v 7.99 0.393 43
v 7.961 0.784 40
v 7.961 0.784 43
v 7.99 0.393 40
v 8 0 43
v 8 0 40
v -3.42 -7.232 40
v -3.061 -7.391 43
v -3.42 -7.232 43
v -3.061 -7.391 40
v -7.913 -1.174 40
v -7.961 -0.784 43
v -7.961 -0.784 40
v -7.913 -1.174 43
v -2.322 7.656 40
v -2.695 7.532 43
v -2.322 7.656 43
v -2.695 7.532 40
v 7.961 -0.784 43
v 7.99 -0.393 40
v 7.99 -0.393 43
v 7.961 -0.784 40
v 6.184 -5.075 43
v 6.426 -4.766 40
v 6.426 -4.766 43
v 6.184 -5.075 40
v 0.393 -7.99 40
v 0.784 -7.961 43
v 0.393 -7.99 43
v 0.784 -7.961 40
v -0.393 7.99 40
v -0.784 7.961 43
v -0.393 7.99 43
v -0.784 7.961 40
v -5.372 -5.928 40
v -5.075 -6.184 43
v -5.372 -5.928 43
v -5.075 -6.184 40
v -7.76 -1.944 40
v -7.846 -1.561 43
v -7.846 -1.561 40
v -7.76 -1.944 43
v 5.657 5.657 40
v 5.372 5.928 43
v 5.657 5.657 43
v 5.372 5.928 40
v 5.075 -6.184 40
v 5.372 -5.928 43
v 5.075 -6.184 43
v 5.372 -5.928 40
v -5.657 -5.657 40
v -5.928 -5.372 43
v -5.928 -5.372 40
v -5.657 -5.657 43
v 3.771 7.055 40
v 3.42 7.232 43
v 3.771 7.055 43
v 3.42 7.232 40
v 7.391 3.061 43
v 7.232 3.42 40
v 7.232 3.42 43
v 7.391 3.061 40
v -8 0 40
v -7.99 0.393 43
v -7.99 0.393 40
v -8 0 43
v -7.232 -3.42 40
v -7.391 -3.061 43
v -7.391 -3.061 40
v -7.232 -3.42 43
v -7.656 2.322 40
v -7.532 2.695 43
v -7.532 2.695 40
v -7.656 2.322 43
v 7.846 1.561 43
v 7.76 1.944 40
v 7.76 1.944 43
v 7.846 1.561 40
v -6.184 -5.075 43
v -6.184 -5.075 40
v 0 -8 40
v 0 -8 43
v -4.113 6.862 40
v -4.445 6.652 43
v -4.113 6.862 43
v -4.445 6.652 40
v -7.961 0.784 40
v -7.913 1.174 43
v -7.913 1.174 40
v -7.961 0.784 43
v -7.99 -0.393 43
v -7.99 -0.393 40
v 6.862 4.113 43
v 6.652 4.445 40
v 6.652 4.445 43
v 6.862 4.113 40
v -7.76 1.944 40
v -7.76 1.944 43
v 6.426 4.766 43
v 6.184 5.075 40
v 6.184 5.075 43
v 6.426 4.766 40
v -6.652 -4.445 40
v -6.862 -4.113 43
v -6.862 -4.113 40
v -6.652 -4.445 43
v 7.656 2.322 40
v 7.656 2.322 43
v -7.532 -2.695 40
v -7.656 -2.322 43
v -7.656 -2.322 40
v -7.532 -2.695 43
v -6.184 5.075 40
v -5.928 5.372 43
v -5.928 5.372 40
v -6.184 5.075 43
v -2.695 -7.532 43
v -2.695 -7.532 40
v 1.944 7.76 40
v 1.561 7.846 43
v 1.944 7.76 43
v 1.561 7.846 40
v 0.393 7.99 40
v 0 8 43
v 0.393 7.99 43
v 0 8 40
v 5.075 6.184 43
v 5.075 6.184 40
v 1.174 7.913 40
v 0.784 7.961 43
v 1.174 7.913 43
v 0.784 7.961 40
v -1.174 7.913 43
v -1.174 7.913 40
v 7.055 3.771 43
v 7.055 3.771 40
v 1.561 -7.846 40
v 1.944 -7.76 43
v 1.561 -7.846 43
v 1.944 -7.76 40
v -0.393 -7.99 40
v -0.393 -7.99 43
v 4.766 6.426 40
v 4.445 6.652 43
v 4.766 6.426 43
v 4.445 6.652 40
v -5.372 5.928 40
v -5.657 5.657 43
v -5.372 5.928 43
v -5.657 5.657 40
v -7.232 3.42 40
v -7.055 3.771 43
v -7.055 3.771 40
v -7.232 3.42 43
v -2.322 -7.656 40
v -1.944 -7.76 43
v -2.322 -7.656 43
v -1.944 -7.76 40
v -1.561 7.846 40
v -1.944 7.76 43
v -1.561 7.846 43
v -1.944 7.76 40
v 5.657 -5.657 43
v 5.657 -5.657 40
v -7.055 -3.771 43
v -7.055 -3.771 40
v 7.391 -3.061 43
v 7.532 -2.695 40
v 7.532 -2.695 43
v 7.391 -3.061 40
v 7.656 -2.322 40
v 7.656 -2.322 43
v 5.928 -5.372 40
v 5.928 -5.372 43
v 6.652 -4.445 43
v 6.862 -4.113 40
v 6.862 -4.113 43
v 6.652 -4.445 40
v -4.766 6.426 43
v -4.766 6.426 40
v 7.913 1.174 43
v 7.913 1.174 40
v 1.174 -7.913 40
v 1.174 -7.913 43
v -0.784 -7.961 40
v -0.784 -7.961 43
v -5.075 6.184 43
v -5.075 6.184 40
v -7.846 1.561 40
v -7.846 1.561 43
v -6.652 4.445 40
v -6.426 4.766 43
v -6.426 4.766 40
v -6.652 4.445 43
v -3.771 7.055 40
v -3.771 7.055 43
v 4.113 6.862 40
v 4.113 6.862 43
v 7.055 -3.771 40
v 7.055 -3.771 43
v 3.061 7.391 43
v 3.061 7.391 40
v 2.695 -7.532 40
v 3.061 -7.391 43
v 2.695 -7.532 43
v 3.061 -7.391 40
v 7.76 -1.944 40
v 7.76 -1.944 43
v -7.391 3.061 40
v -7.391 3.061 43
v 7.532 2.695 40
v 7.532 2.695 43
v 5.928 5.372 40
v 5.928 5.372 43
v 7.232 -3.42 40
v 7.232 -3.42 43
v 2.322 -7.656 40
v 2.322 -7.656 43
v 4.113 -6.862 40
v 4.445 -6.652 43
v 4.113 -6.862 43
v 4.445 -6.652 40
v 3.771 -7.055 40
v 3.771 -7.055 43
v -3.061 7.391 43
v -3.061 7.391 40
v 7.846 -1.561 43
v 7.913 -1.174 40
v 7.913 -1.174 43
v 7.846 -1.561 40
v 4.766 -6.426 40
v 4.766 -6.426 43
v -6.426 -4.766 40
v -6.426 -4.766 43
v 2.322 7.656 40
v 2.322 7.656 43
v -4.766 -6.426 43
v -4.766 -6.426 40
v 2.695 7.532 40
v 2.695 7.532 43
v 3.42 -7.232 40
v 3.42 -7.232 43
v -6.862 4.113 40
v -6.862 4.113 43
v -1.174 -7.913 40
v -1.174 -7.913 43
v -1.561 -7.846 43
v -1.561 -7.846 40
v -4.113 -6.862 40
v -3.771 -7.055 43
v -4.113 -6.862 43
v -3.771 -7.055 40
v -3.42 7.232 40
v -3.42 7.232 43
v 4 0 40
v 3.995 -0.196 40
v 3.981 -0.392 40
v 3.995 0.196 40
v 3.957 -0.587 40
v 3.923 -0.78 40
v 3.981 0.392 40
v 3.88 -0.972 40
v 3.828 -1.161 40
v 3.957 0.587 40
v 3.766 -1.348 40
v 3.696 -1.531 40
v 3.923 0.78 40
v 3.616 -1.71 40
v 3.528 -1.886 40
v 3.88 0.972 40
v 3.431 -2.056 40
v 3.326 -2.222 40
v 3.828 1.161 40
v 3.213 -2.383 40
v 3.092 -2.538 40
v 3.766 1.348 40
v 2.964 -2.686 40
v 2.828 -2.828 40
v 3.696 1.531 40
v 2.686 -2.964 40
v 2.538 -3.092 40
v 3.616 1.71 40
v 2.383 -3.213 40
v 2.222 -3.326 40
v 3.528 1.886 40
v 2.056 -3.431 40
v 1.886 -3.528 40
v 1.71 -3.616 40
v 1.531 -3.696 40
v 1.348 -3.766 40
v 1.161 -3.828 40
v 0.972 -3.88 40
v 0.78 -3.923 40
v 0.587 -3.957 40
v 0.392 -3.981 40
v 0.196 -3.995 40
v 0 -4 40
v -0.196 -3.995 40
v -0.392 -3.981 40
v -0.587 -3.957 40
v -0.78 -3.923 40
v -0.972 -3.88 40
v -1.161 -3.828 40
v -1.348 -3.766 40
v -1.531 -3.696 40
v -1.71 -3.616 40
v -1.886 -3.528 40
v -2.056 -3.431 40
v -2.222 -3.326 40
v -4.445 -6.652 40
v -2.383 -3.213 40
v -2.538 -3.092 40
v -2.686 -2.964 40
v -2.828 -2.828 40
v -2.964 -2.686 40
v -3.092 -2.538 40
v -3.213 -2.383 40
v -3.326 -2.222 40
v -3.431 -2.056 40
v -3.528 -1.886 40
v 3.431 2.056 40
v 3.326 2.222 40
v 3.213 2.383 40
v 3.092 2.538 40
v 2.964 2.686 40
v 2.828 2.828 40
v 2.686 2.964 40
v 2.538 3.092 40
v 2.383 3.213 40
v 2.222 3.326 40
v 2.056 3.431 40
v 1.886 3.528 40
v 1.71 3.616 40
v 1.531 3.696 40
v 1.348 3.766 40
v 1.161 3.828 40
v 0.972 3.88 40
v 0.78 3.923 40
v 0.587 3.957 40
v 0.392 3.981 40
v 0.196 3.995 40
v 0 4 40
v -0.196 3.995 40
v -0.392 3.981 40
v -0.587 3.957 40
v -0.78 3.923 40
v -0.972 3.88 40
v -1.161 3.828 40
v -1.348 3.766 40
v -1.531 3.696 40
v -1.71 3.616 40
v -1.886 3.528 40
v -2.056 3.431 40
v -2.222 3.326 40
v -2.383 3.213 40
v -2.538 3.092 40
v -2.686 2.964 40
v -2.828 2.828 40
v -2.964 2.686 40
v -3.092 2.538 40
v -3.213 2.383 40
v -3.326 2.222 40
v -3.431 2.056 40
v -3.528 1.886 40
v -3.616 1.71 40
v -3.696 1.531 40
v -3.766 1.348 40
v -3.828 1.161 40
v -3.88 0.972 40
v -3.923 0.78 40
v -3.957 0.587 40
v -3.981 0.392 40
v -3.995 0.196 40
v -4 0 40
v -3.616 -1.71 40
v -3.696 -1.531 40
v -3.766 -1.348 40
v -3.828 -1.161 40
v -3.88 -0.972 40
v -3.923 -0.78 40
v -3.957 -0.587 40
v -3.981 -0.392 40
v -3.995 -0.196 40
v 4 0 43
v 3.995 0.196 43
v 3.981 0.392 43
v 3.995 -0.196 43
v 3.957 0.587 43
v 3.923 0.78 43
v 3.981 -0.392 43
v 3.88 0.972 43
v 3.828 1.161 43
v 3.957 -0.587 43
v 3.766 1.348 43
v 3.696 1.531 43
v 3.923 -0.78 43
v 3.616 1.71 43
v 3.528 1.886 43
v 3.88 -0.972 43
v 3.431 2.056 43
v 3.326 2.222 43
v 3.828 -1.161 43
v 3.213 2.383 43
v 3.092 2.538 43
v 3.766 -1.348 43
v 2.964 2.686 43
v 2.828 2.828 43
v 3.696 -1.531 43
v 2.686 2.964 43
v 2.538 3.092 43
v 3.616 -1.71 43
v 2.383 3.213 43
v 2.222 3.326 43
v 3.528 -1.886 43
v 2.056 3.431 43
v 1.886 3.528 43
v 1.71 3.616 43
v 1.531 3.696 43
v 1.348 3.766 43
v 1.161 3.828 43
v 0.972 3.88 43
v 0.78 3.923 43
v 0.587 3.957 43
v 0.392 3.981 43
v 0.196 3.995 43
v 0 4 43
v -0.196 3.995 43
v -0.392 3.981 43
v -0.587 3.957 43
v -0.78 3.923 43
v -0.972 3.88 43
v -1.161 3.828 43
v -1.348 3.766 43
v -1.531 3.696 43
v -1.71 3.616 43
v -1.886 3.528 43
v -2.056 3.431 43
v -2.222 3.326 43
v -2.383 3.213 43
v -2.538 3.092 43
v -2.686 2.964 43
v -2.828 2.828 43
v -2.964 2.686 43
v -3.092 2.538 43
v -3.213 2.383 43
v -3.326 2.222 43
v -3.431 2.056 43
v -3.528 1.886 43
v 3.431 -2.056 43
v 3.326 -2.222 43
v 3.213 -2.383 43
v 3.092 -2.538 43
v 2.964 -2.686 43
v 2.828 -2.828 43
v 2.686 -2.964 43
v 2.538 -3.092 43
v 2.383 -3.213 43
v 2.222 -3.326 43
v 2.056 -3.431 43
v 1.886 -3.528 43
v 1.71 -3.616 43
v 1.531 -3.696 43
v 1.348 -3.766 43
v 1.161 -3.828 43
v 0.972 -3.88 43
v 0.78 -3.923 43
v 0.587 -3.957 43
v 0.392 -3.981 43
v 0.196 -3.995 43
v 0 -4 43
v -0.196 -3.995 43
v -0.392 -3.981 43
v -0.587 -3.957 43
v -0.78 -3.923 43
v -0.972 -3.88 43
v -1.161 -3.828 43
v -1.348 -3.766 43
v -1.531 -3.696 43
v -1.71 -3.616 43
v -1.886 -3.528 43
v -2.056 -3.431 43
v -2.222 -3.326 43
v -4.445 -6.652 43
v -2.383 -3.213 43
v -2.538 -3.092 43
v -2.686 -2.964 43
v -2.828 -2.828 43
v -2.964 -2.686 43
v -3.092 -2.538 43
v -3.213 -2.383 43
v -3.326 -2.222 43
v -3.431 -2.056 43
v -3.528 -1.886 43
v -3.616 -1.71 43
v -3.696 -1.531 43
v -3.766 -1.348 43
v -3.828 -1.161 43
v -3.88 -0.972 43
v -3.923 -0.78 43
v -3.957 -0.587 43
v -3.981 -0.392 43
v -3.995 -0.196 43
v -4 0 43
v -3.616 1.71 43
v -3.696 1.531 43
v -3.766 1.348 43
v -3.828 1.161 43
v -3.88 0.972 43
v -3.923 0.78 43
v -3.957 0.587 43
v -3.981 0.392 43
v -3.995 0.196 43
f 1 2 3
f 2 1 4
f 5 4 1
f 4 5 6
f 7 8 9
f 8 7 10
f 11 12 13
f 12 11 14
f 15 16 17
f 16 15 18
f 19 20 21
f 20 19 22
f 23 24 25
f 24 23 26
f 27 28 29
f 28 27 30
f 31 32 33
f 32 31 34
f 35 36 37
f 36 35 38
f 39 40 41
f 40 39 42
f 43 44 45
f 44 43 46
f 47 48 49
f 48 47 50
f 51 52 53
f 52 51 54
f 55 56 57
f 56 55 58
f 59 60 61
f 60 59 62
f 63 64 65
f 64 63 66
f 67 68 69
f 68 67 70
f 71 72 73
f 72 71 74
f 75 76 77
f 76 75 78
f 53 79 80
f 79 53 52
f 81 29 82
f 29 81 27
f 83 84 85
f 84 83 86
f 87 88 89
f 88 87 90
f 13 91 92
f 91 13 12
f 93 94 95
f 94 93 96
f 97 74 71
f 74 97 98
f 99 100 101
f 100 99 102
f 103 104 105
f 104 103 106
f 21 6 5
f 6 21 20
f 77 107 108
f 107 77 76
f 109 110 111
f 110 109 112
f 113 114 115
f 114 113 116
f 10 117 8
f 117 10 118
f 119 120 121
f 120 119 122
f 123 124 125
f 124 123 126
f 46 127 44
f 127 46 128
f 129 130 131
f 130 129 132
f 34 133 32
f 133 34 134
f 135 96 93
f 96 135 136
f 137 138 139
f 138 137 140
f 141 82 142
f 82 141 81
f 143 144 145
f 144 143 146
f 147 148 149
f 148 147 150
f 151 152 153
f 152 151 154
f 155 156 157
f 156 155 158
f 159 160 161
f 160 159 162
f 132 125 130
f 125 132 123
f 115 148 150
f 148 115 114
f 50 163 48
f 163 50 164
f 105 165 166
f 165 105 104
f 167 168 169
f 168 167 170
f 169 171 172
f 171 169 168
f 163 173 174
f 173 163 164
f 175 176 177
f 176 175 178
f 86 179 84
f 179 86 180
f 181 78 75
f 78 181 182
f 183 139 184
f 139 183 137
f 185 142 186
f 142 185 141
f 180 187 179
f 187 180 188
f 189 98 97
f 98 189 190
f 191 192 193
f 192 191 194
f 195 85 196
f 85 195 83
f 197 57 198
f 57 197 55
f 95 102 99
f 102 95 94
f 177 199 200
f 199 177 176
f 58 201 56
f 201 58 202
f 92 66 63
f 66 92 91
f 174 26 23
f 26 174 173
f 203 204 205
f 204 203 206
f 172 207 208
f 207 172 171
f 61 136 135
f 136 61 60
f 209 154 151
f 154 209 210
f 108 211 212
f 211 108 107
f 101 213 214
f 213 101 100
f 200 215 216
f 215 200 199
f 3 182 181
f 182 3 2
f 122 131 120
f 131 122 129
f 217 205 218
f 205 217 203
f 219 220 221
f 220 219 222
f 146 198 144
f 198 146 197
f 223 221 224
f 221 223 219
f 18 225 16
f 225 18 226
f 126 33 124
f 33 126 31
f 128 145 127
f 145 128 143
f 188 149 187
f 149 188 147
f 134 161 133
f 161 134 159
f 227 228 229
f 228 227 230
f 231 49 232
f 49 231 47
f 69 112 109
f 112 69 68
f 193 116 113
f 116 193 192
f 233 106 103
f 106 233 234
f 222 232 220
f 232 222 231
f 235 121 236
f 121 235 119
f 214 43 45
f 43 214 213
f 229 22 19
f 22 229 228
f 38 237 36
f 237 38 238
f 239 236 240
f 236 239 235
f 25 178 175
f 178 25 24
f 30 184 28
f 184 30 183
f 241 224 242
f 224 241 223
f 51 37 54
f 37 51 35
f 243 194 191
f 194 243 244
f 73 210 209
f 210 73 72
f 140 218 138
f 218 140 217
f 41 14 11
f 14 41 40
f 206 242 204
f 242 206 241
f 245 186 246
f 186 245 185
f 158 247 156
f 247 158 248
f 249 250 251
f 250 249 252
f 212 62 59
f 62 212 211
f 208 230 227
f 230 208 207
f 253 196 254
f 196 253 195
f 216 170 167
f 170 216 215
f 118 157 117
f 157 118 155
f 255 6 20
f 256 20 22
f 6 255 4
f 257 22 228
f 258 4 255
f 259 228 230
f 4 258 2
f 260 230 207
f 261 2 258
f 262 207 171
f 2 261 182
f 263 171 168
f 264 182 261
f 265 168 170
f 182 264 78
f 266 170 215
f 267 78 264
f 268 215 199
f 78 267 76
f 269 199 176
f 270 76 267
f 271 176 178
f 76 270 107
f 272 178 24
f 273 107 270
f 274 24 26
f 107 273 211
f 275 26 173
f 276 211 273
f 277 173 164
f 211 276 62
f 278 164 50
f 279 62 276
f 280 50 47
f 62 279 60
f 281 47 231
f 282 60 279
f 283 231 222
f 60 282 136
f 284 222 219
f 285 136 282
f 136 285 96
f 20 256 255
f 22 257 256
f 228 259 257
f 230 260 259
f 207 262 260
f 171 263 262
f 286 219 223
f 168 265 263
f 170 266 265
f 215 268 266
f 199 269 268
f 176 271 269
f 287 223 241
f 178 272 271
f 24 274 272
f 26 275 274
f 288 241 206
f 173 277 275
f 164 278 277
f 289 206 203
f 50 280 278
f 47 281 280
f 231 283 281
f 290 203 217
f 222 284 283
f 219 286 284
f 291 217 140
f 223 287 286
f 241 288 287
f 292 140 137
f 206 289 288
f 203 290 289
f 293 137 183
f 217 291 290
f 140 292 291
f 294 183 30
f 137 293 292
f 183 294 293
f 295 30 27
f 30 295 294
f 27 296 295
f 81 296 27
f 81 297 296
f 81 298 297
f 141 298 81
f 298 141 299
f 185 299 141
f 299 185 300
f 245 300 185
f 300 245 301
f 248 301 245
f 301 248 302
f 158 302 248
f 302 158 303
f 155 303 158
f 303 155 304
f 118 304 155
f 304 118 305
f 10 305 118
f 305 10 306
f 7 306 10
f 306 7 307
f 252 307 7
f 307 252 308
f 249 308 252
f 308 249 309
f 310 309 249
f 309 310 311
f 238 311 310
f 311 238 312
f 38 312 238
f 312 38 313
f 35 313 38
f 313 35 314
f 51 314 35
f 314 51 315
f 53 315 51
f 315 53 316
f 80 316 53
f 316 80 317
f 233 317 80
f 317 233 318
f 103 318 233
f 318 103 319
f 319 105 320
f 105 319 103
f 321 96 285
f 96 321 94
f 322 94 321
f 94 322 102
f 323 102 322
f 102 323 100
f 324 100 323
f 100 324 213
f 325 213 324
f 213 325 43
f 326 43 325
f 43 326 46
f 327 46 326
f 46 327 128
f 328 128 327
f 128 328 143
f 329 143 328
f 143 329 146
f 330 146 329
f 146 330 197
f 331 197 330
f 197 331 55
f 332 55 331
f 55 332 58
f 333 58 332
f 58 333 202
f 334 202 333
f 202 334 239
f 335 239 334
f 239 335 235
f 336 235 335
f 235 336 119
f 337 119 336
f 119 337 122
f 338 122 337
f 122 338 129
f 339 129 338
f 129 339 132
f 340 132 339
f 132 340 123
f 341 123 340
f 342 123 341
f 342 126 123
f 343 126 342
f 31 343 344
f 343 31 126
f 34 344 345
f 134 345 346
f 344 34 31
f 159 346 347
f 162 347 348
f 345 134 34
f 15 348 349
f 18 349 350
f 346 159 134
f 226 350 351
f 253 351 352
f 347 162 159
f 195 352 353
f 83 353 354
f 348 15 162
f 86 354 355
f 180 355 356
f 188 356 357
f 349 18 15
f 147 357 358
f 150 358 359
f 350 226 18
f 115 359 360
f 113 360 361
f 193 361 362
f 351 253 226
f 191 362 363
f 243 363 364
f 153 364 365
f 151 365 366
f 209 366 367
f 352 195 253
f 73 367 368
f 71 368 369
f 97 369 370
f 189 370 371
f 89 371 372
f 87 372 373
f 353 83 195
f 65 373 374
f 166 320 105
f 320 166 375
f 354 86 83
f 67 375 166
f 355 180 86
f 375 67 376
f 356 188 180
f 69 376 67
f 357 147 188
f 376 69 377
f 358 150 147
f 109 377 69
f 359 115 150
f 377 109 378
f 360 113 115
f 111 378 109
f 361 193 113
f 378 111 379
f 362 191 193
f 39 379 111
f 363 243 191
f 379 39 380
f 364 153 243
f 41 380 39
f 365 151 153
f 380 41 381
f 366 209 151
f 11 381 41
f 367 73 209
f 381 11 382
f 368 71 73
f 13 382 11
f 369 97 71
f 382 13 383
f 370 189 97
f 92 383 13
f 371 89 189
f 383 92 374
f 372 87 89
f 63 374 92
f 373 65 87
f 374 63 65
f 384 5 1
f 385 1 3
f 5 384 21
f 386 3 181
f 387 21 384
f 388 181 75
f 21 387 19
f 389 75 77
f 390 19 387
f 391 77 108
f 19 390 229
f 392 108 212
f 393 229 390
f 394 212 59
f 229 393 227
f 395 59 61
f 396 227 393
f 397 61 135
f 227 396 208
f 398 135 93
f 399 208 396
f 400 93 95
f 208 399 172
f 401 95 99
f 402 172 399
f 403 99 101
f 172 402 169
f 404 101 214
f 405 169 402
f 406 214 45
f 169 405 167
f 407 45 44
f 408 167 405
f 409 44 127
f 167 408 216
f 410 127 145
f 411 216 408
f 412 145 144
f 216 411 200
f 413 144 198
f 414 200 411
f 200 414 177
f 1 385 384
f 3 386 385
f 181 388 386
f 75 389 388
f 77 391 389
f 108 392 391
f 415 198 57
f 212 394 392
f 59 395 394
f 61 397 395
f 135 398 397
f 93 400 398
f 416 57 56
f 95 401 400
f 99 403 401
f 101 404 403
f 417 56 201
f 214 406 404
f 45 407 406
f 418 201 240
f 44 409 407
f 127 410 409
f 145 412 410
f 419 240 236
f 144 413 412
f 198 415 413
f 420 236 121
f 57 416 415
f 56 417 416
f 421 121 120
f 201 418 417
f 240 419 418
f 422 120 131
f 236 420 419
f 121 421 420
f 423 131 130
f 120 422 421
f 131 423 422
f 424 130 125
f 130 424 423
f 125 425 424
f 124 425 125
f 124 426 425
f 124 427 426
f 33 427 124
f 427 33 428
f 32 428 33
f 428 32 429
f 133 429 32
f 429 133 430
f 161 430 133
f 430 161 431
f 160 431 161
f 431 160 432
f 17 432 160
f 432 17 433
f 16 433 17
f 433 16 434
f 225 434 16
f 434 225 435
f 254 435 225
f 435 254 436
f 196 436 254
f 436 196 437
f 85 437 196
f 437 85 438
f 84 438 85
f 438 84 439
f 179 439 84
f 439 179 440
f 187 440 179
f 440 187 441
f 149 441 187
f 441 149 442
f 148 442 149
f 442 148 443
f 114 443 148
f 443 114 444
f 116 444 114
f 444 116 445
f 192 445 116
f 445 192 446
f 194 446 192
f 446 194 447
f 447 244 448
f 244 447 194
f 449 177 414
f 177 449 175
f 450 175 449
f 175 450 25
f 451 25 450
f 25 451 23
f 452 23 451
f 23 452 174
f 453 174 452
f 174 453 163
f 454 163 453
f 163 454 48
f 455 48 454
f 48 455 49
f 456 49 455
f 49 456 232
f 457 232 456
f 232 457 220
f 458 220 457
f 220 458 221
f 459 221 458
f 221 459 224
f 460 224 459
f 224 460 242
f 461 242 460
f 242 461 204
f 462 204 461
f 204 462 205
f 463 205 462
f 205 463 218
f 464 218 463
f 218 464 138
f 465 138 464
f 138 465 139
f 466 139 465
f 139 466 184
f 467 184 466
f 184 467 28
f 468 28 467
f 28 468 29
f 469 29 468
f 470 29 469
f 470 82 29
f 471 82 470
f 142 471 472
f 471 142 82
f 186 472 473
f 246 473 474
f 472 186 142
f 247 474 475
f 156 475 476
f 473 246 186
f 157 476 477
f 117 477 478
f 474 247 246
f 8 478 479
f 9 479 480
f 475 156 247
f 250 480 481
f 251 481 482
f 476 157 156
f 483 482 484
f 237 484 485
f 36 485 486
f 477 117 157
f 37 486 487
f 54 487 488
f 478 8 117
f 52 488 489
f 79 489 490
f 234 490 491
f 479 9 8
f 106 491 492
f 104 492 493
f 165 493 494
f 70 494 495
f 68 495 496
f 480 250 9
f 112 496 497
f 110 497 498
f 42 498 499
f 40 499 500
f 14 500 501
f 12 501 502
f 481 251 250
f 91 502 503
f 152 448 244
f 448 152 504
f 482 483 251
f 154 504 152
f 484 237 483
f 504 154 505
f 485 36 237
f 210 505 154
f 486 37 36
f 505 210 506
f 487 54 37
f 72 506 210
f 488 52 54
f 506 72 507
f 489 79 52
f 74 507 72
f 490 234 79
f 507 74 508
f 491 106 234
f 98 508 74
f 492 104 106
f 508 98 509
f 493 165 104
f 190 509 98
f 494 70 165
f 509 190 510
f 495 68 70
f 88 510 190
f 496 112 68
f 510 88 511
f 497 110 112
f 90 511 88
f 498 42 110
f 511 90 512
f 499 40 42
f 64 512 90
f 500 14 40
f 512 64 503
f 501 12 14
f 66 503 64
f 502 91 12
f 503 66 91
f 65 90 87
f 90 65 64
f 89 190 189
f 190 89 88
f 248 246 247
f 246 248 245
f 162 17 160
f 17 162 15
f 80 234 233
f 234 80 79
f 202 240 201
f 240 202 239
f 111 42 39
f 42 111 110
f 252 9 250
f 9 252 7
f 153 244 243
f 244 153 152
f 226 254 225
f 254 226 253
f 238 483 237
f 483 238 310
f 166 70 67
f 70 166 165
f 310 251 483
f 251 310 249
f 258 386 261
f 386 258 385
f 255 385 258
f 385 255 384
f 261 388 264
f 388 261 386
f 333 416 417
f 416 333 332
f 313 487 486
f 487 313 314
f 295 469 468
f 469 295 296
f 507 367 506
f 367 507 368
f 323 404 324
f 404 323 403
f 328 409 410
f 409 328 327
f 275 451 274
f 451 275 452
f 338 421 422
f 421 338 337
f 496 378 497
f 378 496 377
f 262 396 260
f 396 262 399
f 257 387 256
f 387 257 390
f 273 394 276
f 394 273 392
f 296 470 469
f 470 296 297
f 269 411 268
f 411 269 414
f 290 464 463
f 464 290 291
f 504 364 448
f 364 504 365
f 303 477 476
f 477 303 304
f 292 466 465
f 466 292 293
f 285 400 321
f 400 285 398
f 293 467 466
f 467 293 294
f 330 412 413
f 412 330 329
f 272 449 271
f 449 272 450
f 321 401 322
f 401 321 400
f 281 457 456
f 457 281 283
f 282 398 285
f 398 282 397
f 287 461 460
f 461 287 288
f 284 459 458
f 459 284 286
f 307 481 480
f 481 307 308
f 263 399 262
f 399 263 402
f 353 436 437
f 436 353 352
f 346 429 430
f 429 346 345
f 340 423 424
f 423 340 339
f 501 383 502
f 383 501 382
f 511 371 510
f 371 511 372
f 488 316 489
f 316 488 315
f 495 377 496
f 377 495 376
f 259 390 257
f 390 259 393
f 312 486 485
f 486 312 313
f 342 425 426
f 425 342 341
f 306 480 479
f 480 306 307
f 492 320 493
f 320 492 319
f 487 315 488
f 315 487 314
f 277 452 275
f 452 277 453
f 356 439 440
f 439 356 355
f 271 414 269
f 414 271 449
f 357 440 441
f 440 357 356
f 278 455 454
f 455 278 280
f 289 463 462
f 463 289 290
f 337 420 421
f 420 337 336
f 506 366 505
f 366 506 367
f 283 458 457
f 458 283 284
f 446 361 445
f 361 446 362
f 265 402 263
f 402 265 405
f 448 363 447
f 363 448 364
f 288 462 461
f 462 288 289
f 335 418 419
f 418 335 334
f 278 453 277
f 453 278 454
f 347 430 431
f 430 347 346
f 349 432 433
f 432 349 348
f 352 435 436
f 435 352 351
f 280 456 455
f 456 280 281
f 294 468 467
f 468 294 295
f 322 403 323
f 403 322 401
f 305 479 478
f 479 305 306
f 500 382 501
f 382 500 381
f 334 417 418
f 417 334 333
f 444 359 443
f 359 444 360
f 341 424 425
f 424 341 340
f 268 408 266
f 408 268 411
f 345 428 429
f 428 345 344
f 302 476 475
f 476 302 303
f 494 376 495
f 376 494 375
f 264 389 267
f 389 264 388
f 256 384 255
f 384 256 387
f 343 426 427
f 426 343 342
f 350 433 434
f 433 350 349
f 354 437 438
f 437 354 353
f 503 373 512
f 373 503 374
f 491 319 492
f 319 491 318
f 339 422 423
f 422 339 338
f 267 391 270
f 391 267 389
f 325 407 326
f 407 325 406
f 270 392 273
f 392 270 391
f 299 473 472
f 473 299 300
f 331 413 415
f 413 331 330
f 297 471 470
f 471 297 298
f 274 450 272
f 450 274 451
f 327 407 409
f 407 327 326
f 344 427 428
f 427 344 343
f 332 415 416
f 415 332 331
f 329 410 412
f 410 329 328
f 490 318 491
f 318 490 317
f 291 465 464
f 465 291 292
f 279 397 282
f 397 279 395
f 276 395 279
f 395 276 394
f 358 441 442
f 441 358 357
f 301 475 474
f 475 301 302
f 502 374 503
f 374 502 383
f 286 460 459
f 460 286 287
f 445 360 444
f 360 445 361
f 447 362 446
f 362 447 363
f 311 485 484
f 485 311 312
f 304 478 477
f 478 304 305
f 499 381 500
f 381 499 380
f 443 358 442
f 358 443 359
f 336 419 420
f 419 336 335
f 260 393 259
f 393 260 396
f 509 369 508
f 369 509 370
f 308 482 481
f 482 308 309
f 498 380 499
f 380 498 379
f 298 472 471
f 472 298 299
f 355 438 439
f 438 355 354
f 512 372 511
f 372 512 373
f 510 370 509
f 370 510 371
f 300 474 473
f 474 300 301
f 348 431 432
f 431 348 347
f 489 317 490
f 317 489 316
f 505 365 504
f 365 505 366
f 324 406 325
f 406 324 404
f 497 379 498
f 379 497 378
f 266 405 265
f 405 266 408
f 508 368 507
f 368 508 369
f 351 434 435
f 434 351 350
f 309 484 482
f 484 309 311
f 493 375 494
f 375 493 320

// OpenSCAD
// file: common_params.scad
cylinder_radius = 20.000000;
cylinder_height = 60.000000;
wall_thickness = 2.000000;

cap_thickness = 2.000000;

rod_radius = 2.000000;
rod_height = 50.000000;

ring_outer_radius = 8.000000;
ring_inner_radius = 4.000000;
ring_thickness = 3.000000;
ring_z = 40.000000;

$fn = 128;
// main file
include <common_params.scad>;

translate([0, 0, ring_z])
difference() {
    cylinder(h = ring_thickness, r = ring_outer_radius);
    translate([0, 0, -0.1])
        cylinder(h = ring_thickness + 0.2, r = ring_inner_radius);
}
